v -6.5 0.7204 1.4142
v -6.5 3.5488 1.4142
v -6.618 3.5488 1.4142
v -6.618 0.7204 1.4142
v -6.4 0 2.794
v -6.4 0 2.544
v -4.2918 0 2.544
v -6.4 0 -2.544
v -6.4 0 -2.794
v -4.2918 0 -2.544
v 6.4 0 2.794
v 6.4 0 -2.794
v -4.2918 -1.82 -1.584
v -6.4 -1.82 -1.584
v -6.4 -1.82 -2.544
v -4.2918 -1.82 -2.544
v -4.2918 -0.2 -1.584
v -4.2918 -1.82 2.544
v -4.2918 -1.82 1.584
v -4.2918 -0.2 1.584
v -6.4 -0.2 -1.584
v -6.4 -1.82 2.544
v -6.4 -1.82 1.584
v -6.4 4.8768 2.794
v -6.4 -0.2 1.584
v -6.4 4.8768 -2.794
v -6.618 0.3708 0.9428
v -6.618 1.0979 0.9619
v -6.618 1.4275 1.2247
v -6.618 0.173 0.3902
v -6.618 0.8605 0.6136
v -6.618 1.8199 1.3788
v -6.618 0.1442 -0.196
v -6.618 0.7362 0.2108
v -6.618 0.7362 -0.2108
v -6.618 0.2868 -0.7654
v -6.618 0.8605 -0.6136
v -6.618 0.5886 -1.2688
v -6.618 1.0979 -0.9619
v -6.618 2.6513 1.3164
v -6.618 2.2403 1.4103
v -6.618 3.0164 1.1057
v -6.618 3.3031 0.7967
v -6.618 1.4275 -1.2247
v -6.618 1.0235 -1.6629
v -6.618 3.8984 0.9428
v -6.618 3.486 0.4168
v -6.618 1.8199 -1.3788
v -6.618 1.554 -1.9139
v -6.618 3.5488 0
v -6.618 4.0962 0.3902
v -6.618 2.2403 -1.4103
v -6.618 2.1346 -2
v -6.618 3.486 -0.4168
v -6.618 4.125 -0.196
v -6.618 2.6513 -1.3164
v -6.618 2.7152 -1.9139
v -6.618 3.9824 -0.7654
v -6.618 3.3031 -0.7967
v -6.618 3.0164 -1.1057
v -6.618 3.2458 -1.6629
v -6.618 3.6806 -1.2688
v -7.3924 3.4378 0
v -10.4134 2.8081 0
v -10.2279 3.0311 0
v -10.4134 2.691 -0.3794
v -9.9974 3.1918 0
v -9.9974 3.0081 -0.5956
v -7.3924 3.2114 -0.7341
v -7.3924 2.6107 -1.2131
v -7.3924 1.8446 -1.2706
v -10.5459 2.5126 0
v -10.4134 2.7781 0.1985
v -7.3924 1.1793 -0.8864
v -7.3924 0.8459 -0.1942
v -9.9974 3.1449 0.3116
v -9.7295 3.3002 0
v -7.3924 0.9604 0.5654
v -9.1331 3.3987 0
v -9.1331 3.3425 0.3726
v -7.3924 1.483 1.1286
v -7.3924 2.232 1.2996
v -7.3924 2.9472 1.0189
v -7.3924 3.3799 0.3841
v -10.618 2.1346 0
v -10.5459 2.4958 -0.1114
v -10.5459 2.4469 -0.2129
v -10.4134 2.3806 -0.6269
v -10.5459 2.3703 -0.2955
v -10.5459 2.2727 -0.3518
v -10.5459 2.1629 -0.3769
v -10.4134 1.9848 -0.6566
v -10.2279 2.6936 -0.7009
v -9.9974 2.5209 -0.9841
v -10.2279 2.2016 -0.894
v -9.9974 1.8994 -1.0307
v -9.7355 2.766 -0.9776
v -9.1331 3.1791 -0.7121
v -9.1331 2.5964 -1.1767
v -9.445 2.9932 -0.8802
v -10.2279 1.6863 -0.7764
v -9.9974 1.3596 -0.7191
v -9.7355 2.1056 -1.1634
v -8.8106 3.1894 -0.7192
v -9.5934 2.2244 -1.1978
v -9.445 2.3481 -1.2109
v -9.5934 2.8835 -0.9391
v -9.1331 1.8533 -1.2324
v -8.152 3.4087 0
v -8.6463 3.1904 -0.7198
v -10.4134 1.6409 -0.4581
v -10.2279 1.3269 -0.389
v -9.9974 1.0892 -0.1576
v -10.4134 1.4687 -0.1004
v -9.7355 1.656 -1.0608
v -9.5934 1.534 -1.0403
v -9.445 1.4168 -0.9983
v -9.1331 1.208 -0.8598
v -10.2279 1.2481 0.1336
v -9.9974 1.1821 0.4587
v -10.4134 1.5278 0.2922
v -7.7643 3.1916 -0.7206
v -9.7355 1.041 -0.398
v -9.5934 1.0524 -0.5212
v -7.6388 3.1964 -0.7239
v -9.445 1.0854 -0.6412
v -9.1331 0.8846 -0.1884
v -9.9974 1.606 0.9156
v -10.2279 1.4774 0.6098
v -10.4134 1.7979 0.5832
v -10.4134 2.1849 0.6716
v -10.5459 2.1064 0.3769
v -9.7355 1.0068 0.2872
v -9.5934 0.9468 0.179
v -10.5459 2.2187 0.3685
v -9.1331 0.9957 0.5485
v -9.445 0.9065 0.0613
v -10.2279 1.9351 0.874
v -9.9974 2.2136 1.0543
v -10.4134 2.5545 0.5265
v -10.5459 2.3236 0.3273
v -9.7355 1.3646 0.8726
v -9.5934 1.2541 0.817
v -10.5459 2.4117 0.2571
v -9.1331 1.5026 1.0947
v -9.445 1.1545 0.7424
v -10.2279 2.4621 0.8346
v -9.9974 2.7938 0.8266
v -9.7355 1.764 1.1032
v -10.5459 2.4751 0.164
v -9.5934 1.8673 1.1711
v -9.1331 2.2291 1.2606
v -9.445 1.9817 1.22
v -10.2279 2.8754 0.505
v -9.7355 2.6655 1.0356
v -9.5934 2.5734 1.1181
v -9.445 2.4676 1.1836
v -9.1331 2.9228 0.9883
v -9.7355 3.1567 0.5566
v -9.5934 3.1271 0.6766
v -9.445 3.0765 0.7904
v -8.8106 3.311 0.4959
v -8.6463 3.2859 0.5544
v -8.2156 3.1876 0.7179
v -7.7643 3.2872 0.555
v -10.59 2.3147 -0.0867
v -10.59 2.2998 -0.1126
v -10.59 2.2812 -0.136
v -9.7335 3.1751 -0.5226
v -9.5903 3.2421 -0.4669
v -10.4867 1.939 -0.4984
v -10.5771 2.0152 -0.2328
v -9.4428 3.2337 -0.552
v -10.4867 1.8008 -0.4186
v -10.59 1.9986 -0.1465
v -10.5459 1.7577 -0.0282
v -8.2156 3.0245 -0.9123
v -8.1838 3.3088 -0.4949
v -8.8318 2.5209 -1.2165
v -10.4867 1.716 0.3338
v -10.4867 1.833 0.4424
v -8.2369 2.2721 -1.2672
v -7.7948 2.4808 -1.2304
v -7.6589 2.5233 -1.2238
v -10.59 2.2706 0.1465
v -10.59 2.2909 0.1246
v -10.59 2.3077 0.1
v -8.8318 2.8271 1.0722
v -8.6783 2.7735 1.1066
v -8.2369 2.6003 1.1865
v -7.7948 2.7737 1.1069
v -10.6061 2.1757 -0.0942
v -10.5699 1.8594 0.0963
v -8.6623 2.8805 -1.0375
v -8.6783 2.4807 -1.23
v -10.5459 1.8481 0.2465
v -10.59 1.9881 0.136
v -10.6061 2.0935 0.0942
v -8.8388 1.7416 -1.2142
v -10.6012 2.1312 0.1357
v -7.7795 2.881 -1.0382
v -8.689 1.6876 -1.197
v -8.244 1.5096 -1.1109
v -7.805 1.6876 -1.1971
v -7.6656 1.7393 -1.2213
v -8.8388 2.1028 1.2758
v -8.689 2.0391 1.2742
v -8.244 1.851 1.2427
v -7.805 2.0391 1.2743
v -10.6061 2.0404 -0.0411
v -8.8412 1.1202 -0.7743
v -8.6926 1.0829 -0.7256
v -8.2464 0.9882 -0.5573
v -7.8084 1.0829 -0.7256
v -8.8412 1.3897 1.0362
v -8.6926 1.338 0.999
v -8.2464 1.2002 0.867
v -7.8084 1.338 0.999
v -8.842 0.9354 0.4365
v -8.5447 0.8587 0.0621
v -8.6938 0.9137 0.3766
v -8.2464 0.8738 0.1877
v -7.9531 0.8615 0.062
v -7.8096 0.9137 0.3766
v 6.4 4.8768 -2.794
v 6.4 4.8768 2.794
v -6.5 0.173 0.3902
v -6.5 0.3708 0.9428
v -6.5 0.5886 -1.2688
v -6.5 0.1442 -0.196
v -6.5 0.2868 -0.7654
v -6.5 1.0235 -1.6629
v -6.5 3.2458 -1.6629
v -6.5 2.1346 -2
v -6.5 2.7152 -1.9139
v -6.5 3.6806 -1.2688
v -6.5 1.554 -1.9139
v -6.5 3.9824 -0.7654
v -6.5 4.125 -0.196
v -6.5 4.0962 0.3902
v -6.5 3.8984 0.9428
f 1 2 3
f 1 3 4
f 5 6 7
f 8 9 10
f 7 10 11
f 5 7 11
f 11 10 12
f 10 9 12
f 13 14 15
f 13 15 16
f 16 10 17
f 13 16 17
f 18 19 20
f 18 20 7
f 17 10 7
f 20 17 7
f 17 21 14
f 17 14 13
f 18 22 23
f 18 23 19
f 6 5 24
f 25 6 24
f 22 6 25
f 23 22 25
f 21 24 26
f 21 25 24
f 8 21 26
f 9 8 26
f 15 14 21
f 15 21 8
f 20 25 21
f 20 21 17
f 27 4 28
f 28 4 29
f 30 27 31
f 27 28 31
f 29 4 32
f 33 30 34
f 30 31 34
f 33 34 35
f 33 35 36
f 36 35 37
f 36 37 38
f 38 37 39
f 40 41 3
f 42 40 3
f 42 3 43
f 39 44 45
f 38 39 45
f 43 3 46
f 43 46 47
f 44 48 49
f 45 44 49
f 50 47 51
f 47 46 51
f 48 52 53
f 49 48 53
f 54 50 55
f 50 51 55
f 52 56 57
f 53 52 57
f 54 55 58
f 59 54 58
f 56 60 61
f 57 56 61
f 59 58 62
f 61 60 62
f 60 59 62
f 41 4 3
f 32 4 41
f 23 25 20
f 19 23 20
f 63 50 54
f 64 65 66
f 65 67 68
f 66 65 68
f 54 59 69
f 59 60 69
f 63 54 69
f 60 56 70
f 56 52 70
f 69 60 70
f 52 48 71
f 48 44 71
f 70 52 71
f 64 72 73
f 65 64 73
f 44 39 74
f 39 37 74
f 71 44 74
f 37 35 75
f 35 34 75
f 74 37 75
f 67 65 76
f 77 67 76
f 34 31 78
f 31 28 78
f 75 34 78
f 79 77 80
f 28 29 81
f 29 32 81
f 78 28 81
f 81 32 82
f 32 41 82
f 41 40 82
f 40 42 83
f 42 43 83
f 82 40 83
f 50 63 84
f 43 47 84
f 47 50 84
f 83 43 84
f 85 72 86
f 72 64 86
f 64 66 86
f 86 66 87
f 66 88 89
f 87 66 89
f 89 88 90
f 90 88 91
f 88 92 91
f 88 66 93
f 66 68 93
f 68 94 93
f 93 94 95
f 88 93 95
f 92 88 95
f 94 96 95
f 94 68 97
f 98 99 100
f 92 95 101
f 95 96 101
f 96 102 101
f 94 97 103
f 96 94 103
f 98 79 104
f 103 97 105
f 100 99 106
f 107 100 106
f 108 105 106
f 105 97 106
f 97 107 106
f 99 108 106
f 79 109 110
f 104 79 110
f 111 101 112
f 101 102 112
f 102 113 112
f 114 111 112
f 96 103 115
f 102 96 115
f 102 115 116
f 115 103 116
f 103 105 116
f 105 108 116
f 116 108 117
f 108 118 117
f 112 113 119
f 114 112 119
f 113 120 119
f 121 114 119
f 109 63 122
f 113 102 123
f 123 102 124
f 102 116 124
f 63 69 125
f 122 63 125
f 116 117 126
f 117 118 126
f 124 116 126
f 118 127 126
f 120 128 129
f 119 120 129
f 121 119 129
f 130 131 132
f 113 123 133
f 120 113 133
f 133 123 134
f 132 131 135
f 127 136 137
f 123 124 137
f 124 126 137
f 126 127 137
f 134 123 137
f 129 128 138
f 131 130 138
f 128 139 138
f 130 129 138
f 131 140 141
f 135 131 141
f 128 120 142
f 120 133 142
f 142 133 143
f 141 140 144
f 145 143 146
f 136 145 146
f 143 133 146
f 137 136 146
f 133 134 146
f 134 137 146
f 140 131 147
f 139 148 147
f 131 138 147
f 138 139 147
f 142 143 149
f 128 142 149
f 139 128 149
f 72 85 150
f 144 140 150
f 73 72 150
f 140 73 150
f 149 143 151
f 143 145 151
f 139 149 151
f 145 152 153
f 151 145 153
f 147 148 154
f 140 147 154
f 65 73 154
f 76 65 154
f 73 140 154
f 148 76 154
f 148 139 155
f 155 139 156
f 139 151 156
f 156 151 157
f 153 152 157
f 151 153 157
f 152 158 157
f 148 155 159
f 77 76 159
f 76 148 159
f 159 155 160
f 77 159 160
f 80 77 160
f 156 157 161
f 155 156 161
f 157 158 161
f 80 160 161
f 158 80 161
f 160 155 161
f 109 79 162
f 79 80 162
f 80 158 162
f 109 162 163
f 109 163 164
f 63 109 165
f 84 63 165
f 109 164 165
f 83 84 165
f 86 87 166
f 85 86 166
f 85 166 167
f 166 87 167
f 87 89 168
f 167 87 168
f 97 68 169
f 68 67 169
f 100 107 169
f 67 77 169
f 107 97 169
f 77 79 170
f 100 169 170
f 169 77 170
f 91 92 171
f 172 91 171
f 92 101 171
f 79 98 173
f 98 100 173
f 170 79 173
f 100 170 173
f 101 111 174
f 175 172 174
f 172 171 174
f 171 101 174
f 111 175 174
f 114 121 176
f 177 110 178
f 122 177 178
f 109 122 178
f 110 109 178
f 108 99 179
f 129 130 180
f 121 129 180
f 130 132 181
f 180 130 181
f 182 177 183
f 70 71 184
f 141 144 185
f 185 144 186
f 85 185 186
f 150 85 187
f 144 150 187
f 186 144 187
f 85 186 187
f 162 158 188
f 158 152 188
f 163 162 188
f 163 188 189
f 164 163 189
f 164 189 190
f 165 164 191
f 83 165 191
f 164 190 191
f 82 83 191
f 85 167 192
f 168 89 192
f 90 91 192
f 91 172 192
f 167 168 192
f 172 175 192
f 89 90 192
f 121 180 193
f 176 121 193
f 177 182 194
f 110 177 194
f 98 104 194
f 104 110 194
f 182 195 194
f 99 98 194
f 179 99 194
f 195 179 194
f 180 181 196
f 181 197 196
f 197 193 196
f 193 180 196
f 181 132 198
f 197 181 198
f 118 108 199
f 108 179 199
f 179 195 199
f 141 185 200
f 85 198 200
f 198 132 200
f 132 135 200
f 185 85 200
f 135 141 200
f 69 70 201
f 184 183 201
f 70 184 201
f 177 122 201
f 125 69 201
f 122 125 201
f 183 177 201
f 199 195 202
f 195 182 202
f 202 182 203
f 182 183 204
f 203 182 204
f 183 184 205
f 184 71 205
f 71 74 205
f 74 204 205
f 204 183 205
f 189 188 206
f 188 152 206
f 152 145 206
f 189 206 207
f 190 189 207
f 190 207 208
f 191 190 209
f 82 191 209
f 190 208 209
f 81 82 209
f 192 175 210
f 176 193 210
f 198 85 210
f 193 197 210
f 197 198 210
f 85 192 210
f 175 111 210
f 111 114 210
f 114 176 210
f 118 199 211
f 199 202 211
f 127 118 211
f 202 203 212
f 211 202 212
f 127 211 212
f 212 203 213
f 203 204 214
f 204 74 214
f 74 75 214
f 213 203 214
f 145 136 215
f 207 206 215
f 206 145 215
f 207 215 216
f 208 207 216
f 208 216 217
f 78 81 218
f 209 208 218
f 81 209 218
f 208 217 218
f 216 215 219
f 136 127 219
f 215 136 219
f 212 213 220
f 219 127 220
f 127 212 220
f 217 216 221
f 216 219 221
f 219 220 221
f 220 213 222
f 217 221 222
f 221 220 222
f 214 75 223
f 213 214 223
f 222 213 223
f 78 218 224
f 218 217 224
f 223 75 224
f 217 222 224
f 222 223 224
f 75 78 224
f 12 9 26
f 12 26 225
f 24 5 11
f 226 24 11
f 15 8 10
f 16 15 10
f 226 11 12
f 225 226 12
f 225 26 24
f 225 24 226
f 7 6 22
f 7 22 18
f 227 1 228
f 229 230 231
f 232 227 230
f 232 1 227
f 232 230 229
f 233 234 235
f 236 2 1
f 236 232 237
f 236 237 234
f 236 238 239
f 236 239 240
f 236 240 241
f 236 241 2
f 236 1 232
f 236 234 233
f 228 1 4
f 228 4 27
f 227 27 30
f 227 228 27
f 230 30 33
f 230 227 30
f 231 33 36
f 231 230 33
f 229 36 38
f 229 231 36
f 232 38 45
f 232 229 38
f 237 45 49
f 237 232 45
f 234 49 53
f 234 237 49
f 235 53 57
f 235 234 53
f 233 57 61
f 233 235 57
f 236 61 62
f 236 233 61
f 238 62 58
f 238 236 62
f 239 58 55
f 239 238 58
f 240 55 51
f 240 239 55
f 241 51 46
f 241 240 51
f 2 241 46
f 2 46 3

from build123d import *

# Parameters (mm, degrees)
SKETCH1_W           = 12.8
SKETCH1_H           = 5.588
BOSS_EXTRUDE1_DEPTH = 4.8768
SKETCH2_W           = 2.1082
SKETCH2_H           = 0.96
BOSS_EXTRUDE2_DEPTH = 1.82
SKETCH3_W           = 2.1082
SKETCH3_H           = 5.088
BOSS_EXTRUDE3_DEPTH = 0.2
BOSS_EXTRUDE4_DEPTH = 0.118


with BuildPart() as part:
    # Sketch1 → Boss-Extrude1 (new body)
    with BuildSketch(Plane(origin=(0, 0, 0), x_dir=(1, 0, 0), z_dir=(0, 1, 0))):
        Rectangle(SKETCH1_W, SKETCH1_H)
    extrude(amount=BOSS_EXTRUDE1_DEPTH)

    # Sketch2 → Boss-Extrude2 (add)
    with BuildSketch(Plane.XZ):
        with Locations((-5.3459, 2.064)):
            Rectangle(SKETCH2_W, SKETCH2_H)
        with Locations((-5.3459, -2.064)):
            Rectangle(SKETCH2_W, SKETCH2_H)
    extrude(amount=BOSS_EXTRUDE2_DEPTH)

    # Sketch3 → Boss-Extrude3 (add)
    with BuildSketch(Plane.XZ):
        with Locations((-5.3459, 0)):
            Rectangle(SKETCH3_W, SKETCH3_H)
    extrude(amount=BOSS_EXTRUDE3_DEPTH)


with BuildPart() as body_2:
    # Sketch4 → Boss-Extrude4 (new body)
    with BuildSketch(Plane.ZY.offset(6.5)):
        with BuildLine():
            Line((1.414219818, 3.548815479), (1.414219818, 0.720400865))
            ThreePointArc((1.414219818, 0.720400865), (-2, 2.134608172), (1.414219818, 3.548815479))
        make_face()
    extrude(amount=BOSS_EXTRUDE4_DEPTH)

    # Sketch5 → Revolve1 (revolve)
    with BuildSketch(Plane.XY):
        with BuildLine():
            Line((-6.618, 3.548815479), (-6.618, 2.134608172))
            Line((-6.618, 2.134608172), (-10.618, 2.134608172))
            add(Edge.make_bspline(
                [(-10.618, 2.134608172), (-10.478265298, 3.639589378), (-8.501963306, 3.288678842), (-7.033473389, 3.469874423), (-6.618, 3.548815479)],
                knots=[0, 0, 0, 0, 0.727688779, 1, 1, 1, 1], degree=3))
        make_face()
    revolve(axis=Axis((-6.618, 2.134608172, 0), (-1, 0, 0)))


solid = Compound([part.part, body_2.part])
